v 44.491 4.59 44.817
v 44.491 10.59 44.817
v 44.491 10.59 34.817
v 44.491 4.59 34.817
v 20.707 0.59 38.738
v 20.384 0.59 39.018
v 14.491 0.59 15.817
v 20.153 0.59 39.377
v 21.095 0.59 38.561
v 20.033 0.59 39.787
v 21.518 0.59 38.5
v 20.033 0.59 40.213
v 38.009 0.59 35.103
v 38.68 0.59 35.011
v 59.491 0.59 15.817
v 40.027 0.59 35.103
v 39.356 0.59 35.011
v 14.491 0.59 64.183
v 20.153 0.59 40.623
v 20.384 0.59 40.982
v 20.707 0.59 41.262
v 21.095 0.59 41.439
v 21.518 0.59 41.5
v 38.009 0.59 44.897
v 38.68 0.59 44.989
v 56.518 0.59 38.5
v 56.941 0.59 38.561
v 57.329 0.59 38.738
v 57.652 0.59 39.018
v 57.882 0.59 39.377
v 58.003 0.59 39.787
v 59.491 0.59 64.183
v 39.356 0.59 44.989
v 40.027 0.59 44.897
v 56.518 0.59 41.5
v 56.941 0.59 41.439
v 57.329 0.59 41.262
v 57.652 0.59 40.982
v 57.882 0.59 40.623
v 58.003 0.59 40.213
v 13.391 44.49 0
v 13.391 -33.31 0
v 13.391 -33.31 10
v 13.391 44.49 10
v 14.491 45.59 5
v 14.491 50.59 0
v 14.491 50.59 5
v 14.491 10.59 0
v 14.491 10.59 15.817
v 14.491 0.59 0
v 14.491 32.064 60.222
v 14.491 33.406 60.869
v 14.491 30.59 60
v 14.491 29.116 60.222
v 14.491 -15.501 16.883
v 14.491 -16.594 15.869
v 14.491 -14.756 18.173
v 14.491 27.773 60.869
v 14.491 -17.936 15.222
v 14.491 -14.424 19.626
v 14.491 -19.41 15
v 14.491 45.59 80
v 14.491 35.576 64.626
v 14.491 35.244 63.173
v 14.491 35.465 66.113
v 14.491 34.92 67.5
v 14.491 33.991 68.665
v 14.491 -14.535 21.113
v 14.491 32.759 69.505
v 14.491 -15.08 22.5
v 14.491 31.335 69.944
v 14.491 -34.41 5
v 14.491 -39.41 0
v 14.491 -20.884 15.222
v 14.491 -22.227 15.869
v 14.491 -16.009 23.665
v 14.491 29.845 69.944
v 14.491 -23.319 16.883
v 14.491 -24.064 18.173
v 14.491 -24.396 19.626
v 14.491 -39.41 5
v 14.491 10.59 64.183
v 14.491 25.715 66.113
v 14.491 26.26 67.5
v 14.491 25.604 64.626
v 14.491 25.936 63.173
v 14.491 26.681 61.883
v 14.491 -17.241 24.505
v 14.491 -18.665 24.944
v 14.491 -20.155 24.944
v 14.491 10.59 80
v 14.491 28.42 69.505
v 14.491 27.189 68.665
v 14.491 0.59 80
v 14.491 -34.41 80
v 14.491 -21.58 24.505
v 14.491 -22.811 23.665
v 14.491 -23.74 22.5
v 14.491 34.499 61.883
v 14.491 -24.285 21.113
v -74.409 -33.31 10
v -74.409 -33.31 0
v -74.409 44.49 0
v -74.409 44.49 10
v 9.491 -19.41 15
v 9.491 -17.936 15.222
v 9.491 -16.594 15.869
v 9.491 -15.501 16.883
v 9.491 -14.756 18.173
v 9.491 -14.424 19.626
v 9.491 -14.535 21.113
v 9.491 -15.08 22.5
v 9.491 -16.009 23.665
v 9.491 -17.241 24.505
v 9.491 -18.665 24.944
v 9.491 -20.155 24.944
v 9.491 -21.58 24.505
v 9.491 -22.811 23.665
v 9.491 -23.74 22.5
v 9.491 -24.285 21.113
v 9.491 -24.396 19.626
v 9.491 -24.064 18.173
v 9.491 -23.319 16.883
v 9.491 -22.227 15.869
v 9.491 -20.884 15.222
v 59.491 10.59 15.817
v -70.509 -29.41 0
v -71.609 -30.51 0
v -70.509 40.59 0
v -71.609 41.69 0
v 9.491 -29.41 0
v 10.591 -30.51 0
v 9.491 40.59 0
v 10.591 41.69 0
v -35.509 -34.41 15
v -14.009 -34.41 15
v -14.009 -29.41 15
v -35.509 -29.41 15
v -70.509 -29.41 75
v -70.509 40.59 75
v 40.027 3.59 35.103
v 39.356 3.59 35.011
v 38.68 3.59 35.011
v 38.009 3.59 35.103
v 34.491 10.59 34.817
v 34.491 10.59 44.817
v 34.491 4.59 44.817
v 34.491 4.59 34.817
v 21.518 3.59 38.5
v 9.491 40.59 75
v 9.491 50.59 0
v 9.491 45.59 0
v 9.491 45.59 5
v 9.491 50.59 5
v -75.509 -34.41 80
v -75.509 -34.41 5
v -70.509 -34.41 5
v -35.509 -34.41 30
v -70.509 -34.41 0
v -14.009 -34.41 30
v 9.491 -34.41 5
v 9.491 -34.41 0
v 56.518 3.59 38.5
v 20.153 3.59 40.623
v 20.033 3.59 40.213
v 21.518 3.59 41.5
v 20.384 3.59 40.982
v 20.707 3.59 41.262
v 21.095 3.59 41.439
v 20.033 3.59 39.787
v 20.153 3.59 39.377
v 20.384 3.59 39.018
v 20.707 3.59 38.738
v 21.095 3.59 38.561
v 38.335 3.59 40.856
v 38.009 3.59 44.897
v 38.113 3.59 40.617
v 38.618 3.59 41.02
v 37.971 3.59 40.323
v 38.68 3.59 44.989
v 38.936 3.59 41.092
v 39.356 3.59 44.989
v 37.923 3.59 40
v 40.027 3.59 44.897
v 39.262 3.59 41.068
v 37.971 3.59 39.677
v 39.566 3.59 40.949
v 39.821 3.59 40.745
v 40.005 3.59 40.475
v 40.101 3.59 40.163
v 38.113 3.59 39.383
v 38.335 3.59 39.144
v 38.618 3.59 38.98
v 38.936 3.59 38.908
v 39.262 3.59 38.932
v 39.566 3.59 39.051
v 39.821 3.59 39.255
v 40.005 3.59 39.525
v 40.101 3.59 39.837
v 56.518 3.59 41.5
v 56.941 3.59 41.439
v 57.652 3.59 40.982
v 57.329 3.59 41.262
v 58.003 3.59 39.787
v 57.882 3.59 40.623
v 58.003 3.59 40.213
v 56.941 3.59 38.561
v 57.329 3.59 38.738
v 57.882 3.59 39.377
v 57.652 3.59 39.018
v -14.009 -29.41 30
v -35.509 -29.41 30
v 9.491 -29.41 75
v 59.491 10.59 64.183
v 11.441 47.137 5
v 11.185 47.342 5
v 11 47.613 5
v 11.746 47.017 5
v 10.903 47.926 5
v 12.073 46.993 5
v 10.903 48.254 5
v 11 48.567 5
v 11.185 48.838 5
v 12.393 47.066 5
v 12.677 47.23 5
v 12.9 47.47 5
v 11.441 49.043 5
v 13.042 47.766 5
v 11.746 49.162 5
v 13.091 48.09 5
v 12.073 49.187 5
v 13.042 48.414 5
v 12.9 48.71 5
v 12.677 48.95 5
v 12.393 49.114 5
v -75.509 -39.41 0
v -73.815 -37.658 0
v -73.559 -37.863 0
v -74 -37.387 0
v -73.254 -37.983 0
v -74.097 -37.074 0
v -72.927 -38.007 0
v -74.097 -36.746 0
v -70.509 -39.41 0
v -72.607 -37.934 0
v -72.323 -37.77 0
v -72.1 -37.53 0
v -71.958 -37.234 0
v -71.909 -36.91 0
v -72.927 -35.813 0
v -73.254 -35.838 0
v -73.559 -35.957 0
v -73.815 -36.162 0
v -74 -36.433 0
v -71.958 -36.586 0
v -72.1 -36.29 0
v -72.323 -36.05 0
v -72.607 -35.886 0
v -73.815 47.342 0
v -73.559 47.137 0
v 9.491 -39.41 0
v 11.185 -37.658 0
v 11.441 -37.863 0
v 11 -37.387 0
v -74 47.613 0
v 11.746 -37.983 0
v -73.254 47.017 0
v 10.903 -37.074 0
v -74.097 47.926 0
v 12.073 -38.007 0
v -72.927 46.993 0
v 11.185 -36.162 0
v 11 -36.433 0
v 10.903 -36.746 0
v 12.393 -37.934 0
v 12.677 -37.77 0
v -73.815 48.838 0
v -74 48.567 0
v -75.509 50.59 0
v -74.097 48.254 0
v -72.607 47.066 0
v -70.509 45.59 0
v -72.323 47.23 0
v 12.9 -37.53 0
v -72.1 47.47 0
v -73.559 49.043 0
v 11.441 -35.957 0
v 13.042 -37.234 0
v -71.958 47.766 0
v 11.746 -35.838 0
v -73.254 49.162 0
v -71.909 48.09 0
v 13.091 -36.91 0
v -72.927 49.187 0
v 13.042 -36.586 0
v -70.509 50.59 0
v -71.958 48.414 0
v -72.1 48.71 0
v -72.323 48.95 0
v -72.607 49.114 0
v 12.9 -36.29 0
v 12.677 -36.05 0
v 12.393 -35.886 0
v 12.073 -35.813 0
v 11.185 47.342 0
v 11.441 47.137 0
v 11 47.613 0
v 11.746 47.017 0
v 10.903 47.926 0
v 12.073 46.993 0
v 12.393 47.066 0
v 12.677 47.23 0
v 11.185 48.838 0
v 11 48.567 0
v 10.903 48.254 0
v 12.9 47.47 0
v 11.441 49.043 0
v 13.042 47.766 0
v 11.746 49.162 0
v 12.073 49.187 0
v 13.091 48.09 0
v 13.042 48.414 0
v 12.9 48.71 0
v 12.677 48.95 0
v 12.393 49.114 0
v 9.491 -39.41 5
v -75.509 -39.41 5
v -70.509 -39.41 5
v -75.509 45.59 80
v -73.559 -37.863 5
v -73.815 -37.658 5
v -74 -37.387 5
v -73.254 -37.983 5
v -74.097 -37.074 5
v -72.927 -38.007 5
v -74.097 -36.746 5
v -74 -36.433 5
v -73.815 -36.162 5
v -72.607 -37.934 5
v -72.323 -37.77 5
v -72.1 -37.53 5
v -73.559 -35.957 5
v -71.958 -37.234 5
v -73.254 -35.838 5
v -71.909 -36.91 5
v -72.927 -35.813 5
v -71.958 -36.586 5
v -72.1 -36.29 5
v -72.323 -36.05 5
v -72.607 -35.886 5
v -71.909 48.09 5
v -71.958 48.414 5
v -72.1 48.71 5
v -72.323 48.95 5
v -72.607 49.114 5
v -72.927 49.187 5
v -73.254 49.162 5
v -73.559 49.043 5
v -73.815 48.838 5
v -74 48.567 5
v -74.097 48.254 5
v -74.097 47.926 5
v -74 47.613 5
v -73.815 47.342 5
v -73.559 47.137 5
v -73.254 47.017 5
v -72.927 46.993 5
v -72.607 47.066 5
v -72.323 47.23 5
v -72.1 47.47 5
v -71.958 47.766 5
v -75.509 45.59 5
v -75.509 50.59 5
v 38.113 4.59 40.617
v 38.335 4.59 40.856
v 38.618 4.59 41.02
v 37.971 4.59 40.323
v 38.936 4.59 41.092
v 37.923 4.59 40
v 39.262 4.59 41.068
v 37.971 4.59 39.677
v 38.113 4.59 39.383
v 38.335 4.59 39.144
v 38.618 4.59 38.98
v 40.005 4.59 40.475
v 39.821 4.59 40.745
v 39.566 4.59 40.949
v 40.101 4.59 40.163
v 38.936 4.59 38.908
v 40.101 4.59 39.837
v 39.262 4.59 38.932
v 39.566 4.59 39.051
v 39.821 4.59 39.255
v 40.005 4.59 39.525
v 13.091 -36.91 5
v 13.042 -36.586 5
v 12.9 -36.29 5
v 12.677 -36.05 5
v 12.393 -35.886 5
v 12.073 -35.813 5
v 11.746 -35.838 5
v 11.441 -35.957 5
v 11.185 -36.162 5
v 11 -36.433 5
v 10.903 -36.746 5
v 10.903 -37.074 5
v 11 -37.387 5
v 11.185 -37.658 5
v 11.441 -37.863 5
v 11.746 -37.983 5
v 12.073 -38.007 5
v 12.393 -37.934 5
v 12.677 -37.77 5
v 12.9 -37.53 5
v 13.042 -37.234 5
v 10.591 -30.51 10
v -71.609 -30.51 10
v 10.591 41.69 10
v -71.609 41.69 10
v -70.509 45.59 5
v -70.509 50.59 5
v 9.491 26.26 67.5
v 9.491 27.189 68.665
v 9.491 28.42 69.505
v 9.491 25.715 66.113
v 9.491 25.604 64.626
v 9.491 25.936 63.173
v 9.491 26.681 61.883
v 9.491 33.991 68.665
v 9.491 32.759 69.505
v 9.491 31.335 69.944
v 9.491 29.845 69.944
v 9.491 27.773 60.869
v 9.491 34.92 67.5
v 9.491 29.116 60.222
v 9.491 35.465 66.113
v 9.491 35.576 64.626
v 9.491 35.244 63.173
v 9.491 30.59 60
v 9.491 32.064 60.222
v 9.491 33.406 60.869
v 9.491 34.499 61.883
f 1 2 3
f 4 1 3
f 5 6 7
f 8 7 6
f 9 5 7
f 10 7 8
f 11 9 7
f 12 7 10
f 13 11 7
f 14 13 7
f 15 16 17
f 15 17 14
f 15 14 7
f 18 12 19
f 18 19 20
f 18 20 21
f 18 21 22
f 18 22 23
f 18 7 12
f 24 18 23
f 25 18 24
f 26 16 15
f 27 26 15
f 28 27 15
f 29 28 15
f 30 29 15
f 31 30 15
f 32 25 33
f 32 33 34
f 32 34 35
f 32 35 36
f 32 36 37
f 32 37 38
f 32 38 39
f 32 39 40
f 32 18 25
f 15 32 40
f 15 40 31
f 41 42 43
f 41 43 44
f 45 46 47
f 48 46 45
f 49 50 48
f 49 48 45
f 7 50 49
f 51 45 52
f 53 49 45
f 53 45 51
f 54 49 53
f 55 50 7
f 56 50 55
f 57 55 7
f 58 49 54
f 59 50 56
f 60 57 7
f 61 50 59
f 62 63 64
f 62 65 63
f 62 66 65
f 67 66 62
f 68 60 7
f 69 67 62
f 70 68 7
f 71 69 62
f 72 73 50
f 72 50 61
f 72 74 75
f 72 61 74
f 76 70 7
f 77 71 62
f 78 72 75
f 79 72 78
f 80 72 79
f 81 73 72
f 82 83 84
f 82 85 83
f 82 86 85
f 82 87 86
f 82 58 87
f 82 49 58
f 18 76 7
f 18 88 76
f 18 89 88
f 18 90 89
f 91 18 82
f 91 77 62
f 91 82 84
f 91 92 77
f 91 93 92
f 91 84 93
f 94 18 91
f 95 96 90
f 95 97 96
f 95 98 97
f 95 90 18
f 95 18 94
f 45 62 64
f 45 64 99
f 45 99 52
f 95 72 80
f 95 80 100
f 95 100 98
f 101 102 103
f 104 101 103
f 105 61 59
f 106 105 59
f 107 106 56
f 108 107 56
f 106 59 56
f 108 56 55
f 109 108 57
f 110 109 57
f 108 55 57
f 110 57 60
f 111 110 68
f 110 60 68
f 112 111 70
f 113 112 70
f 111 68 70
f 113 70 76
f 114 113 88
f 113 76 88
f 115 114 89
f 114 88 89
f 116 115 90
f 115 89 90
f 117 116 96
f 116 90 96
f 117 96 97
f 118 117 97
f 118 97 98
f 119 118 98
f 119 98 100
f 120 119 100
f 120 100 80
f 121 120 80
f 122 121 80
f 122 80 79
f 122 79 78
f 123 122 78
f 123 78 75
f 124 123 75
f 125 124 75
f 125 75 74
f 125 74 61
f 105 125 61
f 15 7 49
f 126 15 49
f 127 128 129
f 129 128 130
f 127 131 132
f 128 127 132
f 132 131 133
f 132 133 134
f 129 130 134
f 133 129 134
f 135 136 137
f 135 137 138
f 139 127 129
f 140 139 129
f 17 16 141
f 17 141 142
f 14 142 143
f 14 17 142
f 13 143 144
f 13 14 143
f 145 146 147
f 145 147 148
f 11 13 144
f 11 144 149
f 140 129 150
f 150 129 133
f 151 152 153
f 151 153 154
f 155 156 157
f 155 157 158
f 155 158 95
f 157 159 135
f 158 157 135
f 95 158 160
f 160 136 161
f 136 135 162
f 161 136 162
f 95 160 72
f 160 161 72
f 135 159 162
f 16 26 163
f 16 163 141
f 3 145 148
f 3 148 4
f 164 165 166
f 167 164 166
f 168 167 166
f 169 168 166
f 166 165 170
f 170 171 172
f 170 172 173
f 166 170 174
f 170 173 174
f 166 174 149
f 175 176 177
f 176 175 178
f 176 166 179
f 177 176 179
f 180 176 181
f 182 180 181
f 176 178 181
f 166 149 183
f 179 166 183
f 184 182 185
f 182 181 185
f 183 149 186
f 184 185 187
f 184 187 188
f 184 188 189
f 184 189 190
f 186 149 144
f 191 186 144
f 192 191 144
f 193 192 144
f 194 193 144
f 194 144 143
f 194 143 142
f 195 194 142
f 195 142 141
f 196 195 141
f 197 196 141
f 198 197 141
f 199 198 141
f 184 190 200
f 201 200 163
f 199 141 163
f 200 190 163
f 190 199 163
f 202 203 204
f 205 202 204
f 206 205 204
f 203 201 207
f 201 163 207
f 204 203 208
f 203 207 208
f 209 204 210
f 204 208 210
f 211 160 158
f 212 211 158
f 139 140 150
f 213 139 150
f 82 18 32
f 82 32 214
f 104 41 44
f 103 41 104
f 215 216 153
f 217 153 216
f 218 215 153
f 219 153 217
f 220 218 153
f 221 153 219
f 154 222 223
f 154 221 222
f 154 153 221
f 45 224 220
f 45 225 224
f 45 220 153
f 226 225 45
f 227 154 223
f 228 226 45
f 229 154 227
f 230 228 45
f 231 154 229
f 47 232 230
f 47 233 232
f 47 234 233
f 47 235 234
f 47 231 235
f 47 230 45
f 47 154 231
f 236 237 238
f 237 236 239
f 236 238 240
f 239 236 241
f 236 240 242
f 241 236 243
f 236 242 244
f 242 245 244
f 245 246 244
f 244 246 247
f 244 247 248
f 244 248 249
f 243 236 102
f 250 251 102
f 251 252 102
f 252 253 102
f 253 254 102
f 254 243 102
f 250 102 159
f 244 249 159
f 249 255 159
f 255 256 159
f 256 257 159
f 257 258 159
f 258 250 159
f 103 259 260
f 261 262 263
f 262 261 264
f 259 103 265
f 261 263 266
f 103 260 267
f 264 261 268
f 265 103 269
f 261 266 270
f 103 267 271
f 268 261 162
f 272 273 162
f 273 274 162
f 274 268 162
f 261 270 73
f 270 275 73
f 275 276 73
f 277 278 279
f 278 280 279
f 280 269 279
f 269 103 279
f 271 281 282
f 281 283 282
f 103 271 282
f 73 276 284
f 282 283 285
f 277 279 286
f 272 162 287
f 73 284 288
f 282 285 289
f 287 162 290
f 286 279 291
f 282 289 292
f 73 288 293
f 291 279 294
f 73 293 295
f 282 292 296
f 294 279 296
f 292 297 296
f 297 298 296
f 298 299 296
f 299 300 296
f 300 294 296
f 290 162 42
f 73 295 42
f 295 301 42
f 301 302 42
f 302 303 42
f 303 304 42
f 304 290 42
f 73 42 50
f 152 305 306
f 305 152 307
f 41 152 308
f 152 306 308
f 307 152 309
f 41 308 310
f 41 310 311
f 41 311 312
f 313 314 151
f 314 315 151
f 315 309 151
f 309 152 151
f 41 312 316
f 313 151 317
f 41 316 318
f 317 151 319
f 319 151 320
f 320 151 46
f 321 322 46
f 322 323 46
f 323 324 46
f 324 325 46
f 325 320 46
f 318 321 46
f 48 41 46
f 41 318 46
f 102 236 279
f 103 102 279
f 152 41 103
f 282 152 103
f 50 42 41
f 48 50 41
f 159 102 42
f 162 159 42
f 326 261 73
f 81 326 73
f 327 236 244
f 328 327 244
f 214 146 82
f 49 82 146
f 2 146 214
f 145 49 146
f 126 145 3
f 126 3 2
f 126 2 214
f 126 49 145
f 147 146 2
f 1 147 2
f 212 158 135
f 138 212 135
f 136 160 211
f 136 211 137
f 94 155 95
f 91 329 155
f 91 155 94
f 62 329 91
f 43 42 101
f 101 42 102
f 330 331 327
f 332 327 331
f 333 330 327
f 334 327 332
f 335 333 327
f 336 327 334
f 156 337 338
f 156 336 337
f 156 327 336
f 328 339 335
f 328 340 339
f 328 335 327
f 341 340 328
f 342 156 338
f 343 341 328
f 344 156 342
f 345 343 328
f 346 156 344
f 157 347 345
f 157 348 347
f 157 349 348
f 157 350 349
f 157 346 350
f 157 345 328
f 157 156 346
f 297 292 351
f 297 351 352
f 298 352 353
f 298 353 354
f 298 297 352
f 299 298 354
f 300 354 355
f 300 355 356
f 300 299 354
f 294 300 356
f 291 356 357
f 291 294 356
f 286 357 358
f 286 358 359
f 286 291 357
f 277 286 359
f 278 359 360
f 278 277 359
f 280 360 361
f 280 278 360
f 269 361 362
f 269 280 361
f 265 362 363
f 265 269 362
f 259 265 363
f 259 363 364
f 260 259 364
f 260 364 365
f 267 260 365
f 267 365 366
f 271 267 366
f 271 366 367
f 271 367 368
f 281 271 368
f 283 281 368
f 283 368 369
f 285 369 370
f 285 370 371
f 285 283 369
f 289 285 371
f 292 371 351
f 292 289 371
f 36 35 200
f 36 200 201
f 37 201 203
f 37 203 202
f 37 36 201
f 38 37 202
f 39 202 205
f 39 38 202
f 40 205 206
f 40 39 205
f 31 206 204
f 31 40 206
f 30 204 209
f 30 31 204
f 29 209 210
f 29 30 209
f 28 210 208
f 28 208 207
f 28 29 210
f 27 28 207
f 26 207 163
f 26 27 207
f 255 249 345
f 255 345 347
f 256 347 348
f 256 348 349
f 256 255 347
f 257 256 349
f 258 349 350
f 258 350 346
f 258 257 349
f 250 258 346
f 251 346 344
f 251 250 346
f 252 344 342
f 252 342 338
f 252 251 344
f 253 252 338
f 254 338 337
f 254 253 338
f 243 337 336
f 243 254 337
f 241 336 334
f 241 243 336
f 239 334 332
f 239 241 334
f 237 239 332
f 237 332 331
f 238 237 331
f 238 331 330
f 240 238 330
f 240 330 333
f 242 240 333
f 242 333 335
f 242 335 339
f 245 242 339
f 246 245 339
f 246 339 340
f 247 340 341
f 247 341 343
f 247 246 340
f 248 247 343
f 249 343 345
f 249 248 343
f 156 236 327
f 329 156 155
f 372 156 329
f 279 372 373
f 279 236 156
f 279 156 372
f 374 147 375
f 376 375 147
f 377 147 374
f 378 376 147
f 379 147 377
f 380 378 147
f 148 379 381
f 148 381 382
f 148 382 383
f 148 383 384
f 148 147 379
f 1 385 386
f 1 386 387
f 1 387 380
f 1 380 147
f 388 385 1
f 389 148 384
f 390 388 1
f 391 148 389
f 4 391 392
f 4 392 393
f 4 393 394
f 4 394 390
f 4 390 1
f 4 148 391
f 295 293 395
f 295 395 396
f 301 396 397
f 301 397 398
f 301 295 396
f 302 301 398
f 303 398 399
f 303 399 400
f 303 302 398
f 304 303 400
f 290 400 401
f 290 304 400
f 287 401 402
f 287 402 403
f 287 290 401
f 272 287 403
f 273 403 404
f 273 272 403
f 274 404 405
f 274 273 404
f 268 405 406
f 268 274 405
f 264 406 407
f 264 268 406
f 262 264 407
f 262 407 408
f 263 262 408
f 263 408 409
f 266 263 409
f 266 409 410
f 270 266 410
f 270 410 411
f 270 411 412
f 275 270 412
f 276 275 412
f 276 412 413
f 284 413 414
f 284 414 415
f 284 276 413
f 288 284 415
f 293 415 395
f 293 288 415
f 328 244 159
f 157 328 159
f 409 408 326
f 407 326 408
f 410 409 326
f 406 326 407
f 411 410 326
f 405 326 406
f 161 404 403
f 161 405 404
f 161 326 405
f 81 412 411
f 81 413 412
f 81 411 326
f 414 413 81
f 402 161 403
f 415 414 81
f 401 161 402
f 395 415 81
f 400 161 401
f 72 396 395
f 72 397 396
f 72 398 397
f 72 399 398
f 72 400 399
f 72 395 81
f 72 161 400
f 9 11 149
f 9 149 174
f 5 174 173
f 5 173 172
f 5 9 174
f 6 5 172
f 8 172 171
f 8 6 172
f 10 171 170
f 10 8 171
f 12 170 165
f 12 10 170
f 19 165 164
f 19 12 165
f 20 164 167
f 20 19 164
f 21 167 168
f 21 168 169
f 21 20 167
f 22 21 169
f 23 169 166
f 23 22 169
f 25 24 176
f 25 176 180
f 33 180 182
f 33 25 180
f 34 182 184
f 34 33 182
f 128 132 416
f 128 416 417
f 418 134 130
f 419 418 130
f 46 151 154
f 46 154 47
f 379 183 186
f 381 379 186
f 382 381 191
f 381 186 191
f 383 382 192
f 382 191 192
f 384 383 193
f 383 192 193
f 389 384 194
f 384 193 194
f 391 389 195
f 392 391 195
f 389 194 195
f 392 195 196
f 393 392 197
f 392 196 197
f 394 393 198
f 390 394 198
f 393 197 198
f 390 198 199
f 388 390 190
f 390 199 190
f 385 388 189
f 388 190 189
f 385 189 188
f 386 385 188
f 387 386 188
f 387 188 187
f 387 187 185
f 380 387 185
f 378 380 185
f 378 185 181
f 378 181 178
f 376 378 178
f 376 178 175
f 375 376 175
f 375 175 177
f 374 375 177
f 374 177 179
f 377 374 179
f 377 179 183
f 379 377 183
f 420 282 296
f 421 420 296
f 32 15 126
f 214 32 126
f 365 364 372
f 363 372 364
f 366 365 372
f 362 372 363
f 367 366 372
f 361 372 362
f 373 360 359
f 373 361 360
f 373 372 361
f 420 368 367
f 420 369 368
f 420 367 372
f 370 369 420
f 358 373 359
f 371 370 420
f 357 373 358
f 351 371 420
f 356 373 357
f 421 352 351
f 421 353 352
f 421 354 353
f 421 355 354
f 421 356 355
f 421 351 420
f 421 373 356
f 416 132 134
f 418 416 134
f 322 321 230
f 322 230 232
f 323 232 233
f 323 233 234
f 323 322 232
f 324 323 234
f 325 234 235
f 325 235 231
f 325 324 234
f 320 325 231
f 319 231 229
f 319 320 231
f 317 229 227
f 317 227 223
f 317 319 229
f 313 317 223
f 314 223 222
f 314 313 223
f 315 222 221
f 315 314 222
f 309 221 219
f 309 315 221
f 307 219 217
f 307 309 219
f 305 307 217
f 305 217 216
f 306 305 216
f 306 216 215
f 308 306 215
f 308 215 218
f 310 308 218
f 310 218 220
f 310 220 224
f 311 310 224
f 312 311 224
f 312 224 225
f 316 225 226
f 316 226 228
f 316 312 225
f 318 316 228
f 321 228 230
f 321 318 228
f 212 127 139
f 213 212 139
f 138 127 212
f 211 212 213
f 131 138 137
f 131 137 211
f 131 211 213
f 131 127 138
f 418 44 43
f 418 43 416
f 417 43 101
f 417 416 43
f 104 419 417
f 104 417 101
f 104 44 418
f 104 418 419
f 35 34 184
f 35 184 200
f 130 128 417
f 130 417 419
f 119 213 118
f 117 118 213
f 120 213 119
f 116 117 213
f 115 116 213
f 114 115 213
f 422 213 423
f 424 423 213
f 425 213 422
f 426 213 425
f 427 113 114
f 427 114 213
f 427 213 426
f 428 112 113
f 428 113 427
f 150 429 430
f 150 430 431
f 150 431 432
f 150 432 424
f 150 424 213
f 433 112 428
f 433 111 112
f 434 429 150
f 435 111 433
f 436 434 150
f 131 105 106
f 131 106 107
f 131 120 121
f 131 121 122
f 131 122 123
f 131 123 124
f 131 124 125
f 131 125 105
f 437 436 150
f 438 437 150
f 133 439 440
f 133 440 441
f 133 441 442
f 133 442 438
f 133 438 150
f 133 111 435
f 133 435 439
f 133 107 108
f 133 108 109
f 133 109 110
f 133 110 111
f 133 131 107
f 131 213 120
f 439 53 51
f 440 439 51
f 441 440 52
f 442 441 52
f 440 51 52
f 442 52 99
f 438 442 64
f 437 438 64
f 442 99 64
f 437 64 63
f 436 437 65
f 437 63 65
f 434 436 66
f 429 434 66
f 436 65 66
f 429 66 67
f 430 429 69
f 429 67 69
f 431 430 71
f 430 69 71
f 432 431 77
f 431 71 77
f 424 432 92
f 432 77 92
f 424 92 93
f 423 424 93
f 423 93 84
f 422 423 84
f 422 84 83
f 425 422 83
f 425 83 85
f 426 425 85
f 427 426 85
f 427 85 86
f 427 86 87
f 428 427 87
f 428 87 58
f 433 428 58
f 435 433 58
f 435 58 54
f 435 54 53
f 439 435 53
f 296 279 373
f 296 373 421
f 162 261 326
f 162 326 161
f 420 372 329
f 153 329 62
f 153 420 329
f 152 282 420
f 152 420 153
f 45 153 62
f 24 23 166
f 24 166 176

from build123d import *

# Parameters (mm, degrees)
SKETCH_1_W           = 135
SKETCH_1_H           = 80
EXTRUDE_1_DEPTH      = 80
SKETCH_6_W           = 45
SKETCH_6_H           = 80
CUT_EXTRUDE_1_DEPTH  = 35
SKETCH_5_W           = 45
SKETCH_5_H           = 80
CUT_EXTRUDE_2_DEPTH  = 35
SKETCH_7_W           = 80
SKETCH_7_H           = 70
CUT_EXTRUDE_3_DEPTH  = 75
SKETCH_8_W           = 87.8
SKETCH_8_H           = 77.8
SKETCH_8_W_2         = 82.2
SKETCH_8_H_2         = 72.2
CUT_EXTRUDE_4_DEPTH  = 10
SKETCH_9_R           = 5
CUT_EXTRUDE_5_DEPTH  = 32.4
SKETCH_10_W          = 21.5
SKETCH_10_H          = 15
CUT_EXTRUDE_6_DEPTH  = 10
SKETCH_12_W          = 15.816906699
SKETCH_12_H          = 10
CUT_EXTRUDE_7_DEPTH  = 45
CUT_EXTRUDE_8_DEPTH  = 3
SKETCH_15_W          = 10
SKETCH_15_H          = 10
CUT_EXTRUDE_9_DEPTH  = 6
SKETCH_17_R          = 1.095275866
CUT_EXTRUDE_11_DEPTH = 7
SKETCH_18_W          = 5
SKETCH_18_H          = 5
SKETCH_18_R          = 1.1
EXTRUDE_2_DEPTH      = 5


with BuildPart() as part:
    # 草圖1 → 填料-伸長1 (new body)
    with BuildSketch(Plane.XY):
        with Locations((-8.008902174, 5.58988764)):
            Rectangle(SKETCH_1_W, SKETCH_1_H)
    extrude(amount=EXTRUDE_1_DEPTH)

    # 草圖6 → 除料-伸長1 (cut)
    with BuildSketch(Plane(origin=(0, 45.58988764, 0), x_dir=(1, 0, 0), z_dir=(0, 1, 0))):
        with Locations((36.991097826, -40)):
            Rectangle(SKETCH_6_W, SKETCH_6_H)
    extrude(amount=-CUT_EXTRUDE_1_DEPTH, mode=Mode.SUBTRACT)

    # 草圖5 → 除料-伸長2 (cut)
    with BuildSketch(Plane.XZ.offset(34.41011236)):
        with Locations((36.991097826, 40)):
            Rectangle(SKETCH_5_W, SKETCH_5_H)
    extrude(amount=-CUT_EXTRUDE_2_DEPTH, mode=Mode.SUBTRACT)

    # 草圖7 → 除料-伸長3 (cut)
    with BuildSketch(Plane.XY):
        with Locations((-30.508902174, 5.58988764)):
            Rectangle(SKETCH_7_W, SKETCH_7_H)
    extrude(amount=CUT_EXTRUDE_3_DEPTH, mode=Mode.SUBTRACT)

    # 草圖8 → 除料-伸長4 (cut)
    with BuildSketch(Plane(origin=(0, 0, 0), x_dir=(-1, 0, 0), z_dir=(0, 0, -1))):
        with Locations((30.508902174, 5.58988764)):
            Rectangle(SKETCH_8_W, SKETCH_8_H)
        with Locations((30.508902174, 5.58988764)):
            Rectangle(SKETCH_8_W_2, SKETCH_8_H_2, mode=Mode.SUBTRACT)
    extrude(amount=-CUT_EXTRUDE_4_DEPTH, mode=Mode.SUBTRACT)

    # 草圖9 → 除料-伸長5 (cut)
    with BuildSketch(Plane(origin=(14.491097826, 0, 0), x_dir=(0, 0, -1), z_dir=(1, 0, 0))):
        with Locations((-65, 30.58988764)):
            Circle(SKETCH_9_R)
        with Locations((-20, -19.41011236)):
            Circle(SKETCH_9_R)
    extrude(amount=-CUT_EXTRUDE_5_DEPTH, mode=Mode.SUBTRACT)

    # 草圖10 → 除料-伸長6 (cut)
    with BuildSketch(Plane(origin=(0, -34.41011236, 0), x_dir=(-1, 0, 0), z_dir=(0, -1, 0))):
        with Locations((24.758902174, -22.5)):
            Rectangle(SKETCH_10_W, SKETCH_10_H)
    extrude(amount=-CUT_EXTRUDE_6_DEPTH, mode=Mode.SUBTRACT)

    # 草圖12 → 除料-伸長7 (cut)
    with BuildSketch(Plane(origin=(14.491097826, 0, 0), x_dir=(0, 0, -1), z_dir=(1, 0, 0))):
        with Locations((-72.09154665, 5.58988764)):
            Rectangle(SKETCH_12_W, SKETCH_12_H)
        with Locations((-7.90845335, 5.58988764)):
            Rectangle(SKETCH_12_W, SKETCH_12_H)
    extrude(amount=CUT_EXTRUDE_7_DEPTH, mode=Mode.SUBTRACT)

    # 草圖14 → 除料-伸長8 (cut)
    with BuildSketch(Plane(origin=(0, 0.58988764, 0), x_dir=(-1, 0, 0), z_dir=(0, -1, 0))):
        with BuildLine():
            Line((-38.009101008, -35.10282789), (-21.517914827, -38.5))
            ThreePointArc((-21.517914827, -38.5), (-20.017914827, -40), (-21.517914827, -41.5))
            Line((-21.517914827, -41.5), (-38.009101008, -44.89717211))
            ThreePointArc((-38.009101008, -44.89717211), (-39.017914827, -45), (-40.026728646, -44.89717211))
            Line((-40.026728646, -44.89717211), (-56.517914827, -41.5))
            ThreePointArc((-56.517914827, -41.5), (-58.017914827, -40), (-56.517914827, -38.5))
            Line((-56.517914827, -38.5), (-40.026728646, -35.10282789))
            ThreePointArc((-40.026728646, -35.10282789), (-39.017914827, -35), (-38.009101008, -35.10282789))
        make_face()
    extrude(amount=-CUT_EXTRUDE_8_DEPTH, mode=Mode.SUBTRACT)

    # 草圖15 → 除料-伸長9 (cut)
    with BuildSketch(Plane(origin=(0, 10.58988764, 0), x_dir=(1, 0, 0), z_dir=(0, 1, 0))):
        with Locations((39.491097826, -39.816906699)):
            Rectangle(SKETCH_15_W, SKETCH_15_H)
    extrude(amount=-CUT_EXTRUDE_9_DEPTH, mode=Mode.SUBTRACT)

    # 草圖17 → 除料-伸長11 (cut)
    with BuildSketch(Plane(origin=(0, 0.58988764, 0), x_dir=(-1, 0, 0), z_dir=(0, -1, 0))):
        with Locations((-39.017914827, -40)):
            Circle(SKETCH_17_R)
    extrude(amount=-CUT_EXTRUDE_11_DEPTH, mode=Mode.SUBTRACT)

    # 草圖18 → 填料-伸長2 (add)
    with BuildSketch(Plane.XY):
        with Locations((11.991097826, 48.08988764)):
            Rectangle(SKETCH_18_W, SKETCH_18_H)
        with Locations((11.991097826, 48.08988764)):
            Circle(SKETCH_18_R, mode=Mode.SUBTRACT)
        with Locations((-73.008902174, 48.08988764)):
            Rectangle(SKETCH_18_W, SKETCH_18_H)
        with Locations((-73.008902174, 48.08988764)):
            Circle(SKETCH_18_R, mode=Mode.SUBTRACT)
        with Locations((-73.008902174, -36.91011236)):
            Rectangle(SKETCH_18_W, SKETCH_18_H)
        with Locations((-73.008902174, -36.91011236)):
            Circle(SKETCH_18_R, mode=Mode.SUBTRACT)
        with Locations((11.991097826, -36.91011236)):
            Rectangle(SKETCH_18_W, SKETCH_18_H)
        with Locations((11.991097826, -36.91011236)):
            Circle(SKETCH_18_R, mode=Mode.SUBTRACT)
    extrude(amount=EXTRUDE_2_DEPTH)


solid = part.part
